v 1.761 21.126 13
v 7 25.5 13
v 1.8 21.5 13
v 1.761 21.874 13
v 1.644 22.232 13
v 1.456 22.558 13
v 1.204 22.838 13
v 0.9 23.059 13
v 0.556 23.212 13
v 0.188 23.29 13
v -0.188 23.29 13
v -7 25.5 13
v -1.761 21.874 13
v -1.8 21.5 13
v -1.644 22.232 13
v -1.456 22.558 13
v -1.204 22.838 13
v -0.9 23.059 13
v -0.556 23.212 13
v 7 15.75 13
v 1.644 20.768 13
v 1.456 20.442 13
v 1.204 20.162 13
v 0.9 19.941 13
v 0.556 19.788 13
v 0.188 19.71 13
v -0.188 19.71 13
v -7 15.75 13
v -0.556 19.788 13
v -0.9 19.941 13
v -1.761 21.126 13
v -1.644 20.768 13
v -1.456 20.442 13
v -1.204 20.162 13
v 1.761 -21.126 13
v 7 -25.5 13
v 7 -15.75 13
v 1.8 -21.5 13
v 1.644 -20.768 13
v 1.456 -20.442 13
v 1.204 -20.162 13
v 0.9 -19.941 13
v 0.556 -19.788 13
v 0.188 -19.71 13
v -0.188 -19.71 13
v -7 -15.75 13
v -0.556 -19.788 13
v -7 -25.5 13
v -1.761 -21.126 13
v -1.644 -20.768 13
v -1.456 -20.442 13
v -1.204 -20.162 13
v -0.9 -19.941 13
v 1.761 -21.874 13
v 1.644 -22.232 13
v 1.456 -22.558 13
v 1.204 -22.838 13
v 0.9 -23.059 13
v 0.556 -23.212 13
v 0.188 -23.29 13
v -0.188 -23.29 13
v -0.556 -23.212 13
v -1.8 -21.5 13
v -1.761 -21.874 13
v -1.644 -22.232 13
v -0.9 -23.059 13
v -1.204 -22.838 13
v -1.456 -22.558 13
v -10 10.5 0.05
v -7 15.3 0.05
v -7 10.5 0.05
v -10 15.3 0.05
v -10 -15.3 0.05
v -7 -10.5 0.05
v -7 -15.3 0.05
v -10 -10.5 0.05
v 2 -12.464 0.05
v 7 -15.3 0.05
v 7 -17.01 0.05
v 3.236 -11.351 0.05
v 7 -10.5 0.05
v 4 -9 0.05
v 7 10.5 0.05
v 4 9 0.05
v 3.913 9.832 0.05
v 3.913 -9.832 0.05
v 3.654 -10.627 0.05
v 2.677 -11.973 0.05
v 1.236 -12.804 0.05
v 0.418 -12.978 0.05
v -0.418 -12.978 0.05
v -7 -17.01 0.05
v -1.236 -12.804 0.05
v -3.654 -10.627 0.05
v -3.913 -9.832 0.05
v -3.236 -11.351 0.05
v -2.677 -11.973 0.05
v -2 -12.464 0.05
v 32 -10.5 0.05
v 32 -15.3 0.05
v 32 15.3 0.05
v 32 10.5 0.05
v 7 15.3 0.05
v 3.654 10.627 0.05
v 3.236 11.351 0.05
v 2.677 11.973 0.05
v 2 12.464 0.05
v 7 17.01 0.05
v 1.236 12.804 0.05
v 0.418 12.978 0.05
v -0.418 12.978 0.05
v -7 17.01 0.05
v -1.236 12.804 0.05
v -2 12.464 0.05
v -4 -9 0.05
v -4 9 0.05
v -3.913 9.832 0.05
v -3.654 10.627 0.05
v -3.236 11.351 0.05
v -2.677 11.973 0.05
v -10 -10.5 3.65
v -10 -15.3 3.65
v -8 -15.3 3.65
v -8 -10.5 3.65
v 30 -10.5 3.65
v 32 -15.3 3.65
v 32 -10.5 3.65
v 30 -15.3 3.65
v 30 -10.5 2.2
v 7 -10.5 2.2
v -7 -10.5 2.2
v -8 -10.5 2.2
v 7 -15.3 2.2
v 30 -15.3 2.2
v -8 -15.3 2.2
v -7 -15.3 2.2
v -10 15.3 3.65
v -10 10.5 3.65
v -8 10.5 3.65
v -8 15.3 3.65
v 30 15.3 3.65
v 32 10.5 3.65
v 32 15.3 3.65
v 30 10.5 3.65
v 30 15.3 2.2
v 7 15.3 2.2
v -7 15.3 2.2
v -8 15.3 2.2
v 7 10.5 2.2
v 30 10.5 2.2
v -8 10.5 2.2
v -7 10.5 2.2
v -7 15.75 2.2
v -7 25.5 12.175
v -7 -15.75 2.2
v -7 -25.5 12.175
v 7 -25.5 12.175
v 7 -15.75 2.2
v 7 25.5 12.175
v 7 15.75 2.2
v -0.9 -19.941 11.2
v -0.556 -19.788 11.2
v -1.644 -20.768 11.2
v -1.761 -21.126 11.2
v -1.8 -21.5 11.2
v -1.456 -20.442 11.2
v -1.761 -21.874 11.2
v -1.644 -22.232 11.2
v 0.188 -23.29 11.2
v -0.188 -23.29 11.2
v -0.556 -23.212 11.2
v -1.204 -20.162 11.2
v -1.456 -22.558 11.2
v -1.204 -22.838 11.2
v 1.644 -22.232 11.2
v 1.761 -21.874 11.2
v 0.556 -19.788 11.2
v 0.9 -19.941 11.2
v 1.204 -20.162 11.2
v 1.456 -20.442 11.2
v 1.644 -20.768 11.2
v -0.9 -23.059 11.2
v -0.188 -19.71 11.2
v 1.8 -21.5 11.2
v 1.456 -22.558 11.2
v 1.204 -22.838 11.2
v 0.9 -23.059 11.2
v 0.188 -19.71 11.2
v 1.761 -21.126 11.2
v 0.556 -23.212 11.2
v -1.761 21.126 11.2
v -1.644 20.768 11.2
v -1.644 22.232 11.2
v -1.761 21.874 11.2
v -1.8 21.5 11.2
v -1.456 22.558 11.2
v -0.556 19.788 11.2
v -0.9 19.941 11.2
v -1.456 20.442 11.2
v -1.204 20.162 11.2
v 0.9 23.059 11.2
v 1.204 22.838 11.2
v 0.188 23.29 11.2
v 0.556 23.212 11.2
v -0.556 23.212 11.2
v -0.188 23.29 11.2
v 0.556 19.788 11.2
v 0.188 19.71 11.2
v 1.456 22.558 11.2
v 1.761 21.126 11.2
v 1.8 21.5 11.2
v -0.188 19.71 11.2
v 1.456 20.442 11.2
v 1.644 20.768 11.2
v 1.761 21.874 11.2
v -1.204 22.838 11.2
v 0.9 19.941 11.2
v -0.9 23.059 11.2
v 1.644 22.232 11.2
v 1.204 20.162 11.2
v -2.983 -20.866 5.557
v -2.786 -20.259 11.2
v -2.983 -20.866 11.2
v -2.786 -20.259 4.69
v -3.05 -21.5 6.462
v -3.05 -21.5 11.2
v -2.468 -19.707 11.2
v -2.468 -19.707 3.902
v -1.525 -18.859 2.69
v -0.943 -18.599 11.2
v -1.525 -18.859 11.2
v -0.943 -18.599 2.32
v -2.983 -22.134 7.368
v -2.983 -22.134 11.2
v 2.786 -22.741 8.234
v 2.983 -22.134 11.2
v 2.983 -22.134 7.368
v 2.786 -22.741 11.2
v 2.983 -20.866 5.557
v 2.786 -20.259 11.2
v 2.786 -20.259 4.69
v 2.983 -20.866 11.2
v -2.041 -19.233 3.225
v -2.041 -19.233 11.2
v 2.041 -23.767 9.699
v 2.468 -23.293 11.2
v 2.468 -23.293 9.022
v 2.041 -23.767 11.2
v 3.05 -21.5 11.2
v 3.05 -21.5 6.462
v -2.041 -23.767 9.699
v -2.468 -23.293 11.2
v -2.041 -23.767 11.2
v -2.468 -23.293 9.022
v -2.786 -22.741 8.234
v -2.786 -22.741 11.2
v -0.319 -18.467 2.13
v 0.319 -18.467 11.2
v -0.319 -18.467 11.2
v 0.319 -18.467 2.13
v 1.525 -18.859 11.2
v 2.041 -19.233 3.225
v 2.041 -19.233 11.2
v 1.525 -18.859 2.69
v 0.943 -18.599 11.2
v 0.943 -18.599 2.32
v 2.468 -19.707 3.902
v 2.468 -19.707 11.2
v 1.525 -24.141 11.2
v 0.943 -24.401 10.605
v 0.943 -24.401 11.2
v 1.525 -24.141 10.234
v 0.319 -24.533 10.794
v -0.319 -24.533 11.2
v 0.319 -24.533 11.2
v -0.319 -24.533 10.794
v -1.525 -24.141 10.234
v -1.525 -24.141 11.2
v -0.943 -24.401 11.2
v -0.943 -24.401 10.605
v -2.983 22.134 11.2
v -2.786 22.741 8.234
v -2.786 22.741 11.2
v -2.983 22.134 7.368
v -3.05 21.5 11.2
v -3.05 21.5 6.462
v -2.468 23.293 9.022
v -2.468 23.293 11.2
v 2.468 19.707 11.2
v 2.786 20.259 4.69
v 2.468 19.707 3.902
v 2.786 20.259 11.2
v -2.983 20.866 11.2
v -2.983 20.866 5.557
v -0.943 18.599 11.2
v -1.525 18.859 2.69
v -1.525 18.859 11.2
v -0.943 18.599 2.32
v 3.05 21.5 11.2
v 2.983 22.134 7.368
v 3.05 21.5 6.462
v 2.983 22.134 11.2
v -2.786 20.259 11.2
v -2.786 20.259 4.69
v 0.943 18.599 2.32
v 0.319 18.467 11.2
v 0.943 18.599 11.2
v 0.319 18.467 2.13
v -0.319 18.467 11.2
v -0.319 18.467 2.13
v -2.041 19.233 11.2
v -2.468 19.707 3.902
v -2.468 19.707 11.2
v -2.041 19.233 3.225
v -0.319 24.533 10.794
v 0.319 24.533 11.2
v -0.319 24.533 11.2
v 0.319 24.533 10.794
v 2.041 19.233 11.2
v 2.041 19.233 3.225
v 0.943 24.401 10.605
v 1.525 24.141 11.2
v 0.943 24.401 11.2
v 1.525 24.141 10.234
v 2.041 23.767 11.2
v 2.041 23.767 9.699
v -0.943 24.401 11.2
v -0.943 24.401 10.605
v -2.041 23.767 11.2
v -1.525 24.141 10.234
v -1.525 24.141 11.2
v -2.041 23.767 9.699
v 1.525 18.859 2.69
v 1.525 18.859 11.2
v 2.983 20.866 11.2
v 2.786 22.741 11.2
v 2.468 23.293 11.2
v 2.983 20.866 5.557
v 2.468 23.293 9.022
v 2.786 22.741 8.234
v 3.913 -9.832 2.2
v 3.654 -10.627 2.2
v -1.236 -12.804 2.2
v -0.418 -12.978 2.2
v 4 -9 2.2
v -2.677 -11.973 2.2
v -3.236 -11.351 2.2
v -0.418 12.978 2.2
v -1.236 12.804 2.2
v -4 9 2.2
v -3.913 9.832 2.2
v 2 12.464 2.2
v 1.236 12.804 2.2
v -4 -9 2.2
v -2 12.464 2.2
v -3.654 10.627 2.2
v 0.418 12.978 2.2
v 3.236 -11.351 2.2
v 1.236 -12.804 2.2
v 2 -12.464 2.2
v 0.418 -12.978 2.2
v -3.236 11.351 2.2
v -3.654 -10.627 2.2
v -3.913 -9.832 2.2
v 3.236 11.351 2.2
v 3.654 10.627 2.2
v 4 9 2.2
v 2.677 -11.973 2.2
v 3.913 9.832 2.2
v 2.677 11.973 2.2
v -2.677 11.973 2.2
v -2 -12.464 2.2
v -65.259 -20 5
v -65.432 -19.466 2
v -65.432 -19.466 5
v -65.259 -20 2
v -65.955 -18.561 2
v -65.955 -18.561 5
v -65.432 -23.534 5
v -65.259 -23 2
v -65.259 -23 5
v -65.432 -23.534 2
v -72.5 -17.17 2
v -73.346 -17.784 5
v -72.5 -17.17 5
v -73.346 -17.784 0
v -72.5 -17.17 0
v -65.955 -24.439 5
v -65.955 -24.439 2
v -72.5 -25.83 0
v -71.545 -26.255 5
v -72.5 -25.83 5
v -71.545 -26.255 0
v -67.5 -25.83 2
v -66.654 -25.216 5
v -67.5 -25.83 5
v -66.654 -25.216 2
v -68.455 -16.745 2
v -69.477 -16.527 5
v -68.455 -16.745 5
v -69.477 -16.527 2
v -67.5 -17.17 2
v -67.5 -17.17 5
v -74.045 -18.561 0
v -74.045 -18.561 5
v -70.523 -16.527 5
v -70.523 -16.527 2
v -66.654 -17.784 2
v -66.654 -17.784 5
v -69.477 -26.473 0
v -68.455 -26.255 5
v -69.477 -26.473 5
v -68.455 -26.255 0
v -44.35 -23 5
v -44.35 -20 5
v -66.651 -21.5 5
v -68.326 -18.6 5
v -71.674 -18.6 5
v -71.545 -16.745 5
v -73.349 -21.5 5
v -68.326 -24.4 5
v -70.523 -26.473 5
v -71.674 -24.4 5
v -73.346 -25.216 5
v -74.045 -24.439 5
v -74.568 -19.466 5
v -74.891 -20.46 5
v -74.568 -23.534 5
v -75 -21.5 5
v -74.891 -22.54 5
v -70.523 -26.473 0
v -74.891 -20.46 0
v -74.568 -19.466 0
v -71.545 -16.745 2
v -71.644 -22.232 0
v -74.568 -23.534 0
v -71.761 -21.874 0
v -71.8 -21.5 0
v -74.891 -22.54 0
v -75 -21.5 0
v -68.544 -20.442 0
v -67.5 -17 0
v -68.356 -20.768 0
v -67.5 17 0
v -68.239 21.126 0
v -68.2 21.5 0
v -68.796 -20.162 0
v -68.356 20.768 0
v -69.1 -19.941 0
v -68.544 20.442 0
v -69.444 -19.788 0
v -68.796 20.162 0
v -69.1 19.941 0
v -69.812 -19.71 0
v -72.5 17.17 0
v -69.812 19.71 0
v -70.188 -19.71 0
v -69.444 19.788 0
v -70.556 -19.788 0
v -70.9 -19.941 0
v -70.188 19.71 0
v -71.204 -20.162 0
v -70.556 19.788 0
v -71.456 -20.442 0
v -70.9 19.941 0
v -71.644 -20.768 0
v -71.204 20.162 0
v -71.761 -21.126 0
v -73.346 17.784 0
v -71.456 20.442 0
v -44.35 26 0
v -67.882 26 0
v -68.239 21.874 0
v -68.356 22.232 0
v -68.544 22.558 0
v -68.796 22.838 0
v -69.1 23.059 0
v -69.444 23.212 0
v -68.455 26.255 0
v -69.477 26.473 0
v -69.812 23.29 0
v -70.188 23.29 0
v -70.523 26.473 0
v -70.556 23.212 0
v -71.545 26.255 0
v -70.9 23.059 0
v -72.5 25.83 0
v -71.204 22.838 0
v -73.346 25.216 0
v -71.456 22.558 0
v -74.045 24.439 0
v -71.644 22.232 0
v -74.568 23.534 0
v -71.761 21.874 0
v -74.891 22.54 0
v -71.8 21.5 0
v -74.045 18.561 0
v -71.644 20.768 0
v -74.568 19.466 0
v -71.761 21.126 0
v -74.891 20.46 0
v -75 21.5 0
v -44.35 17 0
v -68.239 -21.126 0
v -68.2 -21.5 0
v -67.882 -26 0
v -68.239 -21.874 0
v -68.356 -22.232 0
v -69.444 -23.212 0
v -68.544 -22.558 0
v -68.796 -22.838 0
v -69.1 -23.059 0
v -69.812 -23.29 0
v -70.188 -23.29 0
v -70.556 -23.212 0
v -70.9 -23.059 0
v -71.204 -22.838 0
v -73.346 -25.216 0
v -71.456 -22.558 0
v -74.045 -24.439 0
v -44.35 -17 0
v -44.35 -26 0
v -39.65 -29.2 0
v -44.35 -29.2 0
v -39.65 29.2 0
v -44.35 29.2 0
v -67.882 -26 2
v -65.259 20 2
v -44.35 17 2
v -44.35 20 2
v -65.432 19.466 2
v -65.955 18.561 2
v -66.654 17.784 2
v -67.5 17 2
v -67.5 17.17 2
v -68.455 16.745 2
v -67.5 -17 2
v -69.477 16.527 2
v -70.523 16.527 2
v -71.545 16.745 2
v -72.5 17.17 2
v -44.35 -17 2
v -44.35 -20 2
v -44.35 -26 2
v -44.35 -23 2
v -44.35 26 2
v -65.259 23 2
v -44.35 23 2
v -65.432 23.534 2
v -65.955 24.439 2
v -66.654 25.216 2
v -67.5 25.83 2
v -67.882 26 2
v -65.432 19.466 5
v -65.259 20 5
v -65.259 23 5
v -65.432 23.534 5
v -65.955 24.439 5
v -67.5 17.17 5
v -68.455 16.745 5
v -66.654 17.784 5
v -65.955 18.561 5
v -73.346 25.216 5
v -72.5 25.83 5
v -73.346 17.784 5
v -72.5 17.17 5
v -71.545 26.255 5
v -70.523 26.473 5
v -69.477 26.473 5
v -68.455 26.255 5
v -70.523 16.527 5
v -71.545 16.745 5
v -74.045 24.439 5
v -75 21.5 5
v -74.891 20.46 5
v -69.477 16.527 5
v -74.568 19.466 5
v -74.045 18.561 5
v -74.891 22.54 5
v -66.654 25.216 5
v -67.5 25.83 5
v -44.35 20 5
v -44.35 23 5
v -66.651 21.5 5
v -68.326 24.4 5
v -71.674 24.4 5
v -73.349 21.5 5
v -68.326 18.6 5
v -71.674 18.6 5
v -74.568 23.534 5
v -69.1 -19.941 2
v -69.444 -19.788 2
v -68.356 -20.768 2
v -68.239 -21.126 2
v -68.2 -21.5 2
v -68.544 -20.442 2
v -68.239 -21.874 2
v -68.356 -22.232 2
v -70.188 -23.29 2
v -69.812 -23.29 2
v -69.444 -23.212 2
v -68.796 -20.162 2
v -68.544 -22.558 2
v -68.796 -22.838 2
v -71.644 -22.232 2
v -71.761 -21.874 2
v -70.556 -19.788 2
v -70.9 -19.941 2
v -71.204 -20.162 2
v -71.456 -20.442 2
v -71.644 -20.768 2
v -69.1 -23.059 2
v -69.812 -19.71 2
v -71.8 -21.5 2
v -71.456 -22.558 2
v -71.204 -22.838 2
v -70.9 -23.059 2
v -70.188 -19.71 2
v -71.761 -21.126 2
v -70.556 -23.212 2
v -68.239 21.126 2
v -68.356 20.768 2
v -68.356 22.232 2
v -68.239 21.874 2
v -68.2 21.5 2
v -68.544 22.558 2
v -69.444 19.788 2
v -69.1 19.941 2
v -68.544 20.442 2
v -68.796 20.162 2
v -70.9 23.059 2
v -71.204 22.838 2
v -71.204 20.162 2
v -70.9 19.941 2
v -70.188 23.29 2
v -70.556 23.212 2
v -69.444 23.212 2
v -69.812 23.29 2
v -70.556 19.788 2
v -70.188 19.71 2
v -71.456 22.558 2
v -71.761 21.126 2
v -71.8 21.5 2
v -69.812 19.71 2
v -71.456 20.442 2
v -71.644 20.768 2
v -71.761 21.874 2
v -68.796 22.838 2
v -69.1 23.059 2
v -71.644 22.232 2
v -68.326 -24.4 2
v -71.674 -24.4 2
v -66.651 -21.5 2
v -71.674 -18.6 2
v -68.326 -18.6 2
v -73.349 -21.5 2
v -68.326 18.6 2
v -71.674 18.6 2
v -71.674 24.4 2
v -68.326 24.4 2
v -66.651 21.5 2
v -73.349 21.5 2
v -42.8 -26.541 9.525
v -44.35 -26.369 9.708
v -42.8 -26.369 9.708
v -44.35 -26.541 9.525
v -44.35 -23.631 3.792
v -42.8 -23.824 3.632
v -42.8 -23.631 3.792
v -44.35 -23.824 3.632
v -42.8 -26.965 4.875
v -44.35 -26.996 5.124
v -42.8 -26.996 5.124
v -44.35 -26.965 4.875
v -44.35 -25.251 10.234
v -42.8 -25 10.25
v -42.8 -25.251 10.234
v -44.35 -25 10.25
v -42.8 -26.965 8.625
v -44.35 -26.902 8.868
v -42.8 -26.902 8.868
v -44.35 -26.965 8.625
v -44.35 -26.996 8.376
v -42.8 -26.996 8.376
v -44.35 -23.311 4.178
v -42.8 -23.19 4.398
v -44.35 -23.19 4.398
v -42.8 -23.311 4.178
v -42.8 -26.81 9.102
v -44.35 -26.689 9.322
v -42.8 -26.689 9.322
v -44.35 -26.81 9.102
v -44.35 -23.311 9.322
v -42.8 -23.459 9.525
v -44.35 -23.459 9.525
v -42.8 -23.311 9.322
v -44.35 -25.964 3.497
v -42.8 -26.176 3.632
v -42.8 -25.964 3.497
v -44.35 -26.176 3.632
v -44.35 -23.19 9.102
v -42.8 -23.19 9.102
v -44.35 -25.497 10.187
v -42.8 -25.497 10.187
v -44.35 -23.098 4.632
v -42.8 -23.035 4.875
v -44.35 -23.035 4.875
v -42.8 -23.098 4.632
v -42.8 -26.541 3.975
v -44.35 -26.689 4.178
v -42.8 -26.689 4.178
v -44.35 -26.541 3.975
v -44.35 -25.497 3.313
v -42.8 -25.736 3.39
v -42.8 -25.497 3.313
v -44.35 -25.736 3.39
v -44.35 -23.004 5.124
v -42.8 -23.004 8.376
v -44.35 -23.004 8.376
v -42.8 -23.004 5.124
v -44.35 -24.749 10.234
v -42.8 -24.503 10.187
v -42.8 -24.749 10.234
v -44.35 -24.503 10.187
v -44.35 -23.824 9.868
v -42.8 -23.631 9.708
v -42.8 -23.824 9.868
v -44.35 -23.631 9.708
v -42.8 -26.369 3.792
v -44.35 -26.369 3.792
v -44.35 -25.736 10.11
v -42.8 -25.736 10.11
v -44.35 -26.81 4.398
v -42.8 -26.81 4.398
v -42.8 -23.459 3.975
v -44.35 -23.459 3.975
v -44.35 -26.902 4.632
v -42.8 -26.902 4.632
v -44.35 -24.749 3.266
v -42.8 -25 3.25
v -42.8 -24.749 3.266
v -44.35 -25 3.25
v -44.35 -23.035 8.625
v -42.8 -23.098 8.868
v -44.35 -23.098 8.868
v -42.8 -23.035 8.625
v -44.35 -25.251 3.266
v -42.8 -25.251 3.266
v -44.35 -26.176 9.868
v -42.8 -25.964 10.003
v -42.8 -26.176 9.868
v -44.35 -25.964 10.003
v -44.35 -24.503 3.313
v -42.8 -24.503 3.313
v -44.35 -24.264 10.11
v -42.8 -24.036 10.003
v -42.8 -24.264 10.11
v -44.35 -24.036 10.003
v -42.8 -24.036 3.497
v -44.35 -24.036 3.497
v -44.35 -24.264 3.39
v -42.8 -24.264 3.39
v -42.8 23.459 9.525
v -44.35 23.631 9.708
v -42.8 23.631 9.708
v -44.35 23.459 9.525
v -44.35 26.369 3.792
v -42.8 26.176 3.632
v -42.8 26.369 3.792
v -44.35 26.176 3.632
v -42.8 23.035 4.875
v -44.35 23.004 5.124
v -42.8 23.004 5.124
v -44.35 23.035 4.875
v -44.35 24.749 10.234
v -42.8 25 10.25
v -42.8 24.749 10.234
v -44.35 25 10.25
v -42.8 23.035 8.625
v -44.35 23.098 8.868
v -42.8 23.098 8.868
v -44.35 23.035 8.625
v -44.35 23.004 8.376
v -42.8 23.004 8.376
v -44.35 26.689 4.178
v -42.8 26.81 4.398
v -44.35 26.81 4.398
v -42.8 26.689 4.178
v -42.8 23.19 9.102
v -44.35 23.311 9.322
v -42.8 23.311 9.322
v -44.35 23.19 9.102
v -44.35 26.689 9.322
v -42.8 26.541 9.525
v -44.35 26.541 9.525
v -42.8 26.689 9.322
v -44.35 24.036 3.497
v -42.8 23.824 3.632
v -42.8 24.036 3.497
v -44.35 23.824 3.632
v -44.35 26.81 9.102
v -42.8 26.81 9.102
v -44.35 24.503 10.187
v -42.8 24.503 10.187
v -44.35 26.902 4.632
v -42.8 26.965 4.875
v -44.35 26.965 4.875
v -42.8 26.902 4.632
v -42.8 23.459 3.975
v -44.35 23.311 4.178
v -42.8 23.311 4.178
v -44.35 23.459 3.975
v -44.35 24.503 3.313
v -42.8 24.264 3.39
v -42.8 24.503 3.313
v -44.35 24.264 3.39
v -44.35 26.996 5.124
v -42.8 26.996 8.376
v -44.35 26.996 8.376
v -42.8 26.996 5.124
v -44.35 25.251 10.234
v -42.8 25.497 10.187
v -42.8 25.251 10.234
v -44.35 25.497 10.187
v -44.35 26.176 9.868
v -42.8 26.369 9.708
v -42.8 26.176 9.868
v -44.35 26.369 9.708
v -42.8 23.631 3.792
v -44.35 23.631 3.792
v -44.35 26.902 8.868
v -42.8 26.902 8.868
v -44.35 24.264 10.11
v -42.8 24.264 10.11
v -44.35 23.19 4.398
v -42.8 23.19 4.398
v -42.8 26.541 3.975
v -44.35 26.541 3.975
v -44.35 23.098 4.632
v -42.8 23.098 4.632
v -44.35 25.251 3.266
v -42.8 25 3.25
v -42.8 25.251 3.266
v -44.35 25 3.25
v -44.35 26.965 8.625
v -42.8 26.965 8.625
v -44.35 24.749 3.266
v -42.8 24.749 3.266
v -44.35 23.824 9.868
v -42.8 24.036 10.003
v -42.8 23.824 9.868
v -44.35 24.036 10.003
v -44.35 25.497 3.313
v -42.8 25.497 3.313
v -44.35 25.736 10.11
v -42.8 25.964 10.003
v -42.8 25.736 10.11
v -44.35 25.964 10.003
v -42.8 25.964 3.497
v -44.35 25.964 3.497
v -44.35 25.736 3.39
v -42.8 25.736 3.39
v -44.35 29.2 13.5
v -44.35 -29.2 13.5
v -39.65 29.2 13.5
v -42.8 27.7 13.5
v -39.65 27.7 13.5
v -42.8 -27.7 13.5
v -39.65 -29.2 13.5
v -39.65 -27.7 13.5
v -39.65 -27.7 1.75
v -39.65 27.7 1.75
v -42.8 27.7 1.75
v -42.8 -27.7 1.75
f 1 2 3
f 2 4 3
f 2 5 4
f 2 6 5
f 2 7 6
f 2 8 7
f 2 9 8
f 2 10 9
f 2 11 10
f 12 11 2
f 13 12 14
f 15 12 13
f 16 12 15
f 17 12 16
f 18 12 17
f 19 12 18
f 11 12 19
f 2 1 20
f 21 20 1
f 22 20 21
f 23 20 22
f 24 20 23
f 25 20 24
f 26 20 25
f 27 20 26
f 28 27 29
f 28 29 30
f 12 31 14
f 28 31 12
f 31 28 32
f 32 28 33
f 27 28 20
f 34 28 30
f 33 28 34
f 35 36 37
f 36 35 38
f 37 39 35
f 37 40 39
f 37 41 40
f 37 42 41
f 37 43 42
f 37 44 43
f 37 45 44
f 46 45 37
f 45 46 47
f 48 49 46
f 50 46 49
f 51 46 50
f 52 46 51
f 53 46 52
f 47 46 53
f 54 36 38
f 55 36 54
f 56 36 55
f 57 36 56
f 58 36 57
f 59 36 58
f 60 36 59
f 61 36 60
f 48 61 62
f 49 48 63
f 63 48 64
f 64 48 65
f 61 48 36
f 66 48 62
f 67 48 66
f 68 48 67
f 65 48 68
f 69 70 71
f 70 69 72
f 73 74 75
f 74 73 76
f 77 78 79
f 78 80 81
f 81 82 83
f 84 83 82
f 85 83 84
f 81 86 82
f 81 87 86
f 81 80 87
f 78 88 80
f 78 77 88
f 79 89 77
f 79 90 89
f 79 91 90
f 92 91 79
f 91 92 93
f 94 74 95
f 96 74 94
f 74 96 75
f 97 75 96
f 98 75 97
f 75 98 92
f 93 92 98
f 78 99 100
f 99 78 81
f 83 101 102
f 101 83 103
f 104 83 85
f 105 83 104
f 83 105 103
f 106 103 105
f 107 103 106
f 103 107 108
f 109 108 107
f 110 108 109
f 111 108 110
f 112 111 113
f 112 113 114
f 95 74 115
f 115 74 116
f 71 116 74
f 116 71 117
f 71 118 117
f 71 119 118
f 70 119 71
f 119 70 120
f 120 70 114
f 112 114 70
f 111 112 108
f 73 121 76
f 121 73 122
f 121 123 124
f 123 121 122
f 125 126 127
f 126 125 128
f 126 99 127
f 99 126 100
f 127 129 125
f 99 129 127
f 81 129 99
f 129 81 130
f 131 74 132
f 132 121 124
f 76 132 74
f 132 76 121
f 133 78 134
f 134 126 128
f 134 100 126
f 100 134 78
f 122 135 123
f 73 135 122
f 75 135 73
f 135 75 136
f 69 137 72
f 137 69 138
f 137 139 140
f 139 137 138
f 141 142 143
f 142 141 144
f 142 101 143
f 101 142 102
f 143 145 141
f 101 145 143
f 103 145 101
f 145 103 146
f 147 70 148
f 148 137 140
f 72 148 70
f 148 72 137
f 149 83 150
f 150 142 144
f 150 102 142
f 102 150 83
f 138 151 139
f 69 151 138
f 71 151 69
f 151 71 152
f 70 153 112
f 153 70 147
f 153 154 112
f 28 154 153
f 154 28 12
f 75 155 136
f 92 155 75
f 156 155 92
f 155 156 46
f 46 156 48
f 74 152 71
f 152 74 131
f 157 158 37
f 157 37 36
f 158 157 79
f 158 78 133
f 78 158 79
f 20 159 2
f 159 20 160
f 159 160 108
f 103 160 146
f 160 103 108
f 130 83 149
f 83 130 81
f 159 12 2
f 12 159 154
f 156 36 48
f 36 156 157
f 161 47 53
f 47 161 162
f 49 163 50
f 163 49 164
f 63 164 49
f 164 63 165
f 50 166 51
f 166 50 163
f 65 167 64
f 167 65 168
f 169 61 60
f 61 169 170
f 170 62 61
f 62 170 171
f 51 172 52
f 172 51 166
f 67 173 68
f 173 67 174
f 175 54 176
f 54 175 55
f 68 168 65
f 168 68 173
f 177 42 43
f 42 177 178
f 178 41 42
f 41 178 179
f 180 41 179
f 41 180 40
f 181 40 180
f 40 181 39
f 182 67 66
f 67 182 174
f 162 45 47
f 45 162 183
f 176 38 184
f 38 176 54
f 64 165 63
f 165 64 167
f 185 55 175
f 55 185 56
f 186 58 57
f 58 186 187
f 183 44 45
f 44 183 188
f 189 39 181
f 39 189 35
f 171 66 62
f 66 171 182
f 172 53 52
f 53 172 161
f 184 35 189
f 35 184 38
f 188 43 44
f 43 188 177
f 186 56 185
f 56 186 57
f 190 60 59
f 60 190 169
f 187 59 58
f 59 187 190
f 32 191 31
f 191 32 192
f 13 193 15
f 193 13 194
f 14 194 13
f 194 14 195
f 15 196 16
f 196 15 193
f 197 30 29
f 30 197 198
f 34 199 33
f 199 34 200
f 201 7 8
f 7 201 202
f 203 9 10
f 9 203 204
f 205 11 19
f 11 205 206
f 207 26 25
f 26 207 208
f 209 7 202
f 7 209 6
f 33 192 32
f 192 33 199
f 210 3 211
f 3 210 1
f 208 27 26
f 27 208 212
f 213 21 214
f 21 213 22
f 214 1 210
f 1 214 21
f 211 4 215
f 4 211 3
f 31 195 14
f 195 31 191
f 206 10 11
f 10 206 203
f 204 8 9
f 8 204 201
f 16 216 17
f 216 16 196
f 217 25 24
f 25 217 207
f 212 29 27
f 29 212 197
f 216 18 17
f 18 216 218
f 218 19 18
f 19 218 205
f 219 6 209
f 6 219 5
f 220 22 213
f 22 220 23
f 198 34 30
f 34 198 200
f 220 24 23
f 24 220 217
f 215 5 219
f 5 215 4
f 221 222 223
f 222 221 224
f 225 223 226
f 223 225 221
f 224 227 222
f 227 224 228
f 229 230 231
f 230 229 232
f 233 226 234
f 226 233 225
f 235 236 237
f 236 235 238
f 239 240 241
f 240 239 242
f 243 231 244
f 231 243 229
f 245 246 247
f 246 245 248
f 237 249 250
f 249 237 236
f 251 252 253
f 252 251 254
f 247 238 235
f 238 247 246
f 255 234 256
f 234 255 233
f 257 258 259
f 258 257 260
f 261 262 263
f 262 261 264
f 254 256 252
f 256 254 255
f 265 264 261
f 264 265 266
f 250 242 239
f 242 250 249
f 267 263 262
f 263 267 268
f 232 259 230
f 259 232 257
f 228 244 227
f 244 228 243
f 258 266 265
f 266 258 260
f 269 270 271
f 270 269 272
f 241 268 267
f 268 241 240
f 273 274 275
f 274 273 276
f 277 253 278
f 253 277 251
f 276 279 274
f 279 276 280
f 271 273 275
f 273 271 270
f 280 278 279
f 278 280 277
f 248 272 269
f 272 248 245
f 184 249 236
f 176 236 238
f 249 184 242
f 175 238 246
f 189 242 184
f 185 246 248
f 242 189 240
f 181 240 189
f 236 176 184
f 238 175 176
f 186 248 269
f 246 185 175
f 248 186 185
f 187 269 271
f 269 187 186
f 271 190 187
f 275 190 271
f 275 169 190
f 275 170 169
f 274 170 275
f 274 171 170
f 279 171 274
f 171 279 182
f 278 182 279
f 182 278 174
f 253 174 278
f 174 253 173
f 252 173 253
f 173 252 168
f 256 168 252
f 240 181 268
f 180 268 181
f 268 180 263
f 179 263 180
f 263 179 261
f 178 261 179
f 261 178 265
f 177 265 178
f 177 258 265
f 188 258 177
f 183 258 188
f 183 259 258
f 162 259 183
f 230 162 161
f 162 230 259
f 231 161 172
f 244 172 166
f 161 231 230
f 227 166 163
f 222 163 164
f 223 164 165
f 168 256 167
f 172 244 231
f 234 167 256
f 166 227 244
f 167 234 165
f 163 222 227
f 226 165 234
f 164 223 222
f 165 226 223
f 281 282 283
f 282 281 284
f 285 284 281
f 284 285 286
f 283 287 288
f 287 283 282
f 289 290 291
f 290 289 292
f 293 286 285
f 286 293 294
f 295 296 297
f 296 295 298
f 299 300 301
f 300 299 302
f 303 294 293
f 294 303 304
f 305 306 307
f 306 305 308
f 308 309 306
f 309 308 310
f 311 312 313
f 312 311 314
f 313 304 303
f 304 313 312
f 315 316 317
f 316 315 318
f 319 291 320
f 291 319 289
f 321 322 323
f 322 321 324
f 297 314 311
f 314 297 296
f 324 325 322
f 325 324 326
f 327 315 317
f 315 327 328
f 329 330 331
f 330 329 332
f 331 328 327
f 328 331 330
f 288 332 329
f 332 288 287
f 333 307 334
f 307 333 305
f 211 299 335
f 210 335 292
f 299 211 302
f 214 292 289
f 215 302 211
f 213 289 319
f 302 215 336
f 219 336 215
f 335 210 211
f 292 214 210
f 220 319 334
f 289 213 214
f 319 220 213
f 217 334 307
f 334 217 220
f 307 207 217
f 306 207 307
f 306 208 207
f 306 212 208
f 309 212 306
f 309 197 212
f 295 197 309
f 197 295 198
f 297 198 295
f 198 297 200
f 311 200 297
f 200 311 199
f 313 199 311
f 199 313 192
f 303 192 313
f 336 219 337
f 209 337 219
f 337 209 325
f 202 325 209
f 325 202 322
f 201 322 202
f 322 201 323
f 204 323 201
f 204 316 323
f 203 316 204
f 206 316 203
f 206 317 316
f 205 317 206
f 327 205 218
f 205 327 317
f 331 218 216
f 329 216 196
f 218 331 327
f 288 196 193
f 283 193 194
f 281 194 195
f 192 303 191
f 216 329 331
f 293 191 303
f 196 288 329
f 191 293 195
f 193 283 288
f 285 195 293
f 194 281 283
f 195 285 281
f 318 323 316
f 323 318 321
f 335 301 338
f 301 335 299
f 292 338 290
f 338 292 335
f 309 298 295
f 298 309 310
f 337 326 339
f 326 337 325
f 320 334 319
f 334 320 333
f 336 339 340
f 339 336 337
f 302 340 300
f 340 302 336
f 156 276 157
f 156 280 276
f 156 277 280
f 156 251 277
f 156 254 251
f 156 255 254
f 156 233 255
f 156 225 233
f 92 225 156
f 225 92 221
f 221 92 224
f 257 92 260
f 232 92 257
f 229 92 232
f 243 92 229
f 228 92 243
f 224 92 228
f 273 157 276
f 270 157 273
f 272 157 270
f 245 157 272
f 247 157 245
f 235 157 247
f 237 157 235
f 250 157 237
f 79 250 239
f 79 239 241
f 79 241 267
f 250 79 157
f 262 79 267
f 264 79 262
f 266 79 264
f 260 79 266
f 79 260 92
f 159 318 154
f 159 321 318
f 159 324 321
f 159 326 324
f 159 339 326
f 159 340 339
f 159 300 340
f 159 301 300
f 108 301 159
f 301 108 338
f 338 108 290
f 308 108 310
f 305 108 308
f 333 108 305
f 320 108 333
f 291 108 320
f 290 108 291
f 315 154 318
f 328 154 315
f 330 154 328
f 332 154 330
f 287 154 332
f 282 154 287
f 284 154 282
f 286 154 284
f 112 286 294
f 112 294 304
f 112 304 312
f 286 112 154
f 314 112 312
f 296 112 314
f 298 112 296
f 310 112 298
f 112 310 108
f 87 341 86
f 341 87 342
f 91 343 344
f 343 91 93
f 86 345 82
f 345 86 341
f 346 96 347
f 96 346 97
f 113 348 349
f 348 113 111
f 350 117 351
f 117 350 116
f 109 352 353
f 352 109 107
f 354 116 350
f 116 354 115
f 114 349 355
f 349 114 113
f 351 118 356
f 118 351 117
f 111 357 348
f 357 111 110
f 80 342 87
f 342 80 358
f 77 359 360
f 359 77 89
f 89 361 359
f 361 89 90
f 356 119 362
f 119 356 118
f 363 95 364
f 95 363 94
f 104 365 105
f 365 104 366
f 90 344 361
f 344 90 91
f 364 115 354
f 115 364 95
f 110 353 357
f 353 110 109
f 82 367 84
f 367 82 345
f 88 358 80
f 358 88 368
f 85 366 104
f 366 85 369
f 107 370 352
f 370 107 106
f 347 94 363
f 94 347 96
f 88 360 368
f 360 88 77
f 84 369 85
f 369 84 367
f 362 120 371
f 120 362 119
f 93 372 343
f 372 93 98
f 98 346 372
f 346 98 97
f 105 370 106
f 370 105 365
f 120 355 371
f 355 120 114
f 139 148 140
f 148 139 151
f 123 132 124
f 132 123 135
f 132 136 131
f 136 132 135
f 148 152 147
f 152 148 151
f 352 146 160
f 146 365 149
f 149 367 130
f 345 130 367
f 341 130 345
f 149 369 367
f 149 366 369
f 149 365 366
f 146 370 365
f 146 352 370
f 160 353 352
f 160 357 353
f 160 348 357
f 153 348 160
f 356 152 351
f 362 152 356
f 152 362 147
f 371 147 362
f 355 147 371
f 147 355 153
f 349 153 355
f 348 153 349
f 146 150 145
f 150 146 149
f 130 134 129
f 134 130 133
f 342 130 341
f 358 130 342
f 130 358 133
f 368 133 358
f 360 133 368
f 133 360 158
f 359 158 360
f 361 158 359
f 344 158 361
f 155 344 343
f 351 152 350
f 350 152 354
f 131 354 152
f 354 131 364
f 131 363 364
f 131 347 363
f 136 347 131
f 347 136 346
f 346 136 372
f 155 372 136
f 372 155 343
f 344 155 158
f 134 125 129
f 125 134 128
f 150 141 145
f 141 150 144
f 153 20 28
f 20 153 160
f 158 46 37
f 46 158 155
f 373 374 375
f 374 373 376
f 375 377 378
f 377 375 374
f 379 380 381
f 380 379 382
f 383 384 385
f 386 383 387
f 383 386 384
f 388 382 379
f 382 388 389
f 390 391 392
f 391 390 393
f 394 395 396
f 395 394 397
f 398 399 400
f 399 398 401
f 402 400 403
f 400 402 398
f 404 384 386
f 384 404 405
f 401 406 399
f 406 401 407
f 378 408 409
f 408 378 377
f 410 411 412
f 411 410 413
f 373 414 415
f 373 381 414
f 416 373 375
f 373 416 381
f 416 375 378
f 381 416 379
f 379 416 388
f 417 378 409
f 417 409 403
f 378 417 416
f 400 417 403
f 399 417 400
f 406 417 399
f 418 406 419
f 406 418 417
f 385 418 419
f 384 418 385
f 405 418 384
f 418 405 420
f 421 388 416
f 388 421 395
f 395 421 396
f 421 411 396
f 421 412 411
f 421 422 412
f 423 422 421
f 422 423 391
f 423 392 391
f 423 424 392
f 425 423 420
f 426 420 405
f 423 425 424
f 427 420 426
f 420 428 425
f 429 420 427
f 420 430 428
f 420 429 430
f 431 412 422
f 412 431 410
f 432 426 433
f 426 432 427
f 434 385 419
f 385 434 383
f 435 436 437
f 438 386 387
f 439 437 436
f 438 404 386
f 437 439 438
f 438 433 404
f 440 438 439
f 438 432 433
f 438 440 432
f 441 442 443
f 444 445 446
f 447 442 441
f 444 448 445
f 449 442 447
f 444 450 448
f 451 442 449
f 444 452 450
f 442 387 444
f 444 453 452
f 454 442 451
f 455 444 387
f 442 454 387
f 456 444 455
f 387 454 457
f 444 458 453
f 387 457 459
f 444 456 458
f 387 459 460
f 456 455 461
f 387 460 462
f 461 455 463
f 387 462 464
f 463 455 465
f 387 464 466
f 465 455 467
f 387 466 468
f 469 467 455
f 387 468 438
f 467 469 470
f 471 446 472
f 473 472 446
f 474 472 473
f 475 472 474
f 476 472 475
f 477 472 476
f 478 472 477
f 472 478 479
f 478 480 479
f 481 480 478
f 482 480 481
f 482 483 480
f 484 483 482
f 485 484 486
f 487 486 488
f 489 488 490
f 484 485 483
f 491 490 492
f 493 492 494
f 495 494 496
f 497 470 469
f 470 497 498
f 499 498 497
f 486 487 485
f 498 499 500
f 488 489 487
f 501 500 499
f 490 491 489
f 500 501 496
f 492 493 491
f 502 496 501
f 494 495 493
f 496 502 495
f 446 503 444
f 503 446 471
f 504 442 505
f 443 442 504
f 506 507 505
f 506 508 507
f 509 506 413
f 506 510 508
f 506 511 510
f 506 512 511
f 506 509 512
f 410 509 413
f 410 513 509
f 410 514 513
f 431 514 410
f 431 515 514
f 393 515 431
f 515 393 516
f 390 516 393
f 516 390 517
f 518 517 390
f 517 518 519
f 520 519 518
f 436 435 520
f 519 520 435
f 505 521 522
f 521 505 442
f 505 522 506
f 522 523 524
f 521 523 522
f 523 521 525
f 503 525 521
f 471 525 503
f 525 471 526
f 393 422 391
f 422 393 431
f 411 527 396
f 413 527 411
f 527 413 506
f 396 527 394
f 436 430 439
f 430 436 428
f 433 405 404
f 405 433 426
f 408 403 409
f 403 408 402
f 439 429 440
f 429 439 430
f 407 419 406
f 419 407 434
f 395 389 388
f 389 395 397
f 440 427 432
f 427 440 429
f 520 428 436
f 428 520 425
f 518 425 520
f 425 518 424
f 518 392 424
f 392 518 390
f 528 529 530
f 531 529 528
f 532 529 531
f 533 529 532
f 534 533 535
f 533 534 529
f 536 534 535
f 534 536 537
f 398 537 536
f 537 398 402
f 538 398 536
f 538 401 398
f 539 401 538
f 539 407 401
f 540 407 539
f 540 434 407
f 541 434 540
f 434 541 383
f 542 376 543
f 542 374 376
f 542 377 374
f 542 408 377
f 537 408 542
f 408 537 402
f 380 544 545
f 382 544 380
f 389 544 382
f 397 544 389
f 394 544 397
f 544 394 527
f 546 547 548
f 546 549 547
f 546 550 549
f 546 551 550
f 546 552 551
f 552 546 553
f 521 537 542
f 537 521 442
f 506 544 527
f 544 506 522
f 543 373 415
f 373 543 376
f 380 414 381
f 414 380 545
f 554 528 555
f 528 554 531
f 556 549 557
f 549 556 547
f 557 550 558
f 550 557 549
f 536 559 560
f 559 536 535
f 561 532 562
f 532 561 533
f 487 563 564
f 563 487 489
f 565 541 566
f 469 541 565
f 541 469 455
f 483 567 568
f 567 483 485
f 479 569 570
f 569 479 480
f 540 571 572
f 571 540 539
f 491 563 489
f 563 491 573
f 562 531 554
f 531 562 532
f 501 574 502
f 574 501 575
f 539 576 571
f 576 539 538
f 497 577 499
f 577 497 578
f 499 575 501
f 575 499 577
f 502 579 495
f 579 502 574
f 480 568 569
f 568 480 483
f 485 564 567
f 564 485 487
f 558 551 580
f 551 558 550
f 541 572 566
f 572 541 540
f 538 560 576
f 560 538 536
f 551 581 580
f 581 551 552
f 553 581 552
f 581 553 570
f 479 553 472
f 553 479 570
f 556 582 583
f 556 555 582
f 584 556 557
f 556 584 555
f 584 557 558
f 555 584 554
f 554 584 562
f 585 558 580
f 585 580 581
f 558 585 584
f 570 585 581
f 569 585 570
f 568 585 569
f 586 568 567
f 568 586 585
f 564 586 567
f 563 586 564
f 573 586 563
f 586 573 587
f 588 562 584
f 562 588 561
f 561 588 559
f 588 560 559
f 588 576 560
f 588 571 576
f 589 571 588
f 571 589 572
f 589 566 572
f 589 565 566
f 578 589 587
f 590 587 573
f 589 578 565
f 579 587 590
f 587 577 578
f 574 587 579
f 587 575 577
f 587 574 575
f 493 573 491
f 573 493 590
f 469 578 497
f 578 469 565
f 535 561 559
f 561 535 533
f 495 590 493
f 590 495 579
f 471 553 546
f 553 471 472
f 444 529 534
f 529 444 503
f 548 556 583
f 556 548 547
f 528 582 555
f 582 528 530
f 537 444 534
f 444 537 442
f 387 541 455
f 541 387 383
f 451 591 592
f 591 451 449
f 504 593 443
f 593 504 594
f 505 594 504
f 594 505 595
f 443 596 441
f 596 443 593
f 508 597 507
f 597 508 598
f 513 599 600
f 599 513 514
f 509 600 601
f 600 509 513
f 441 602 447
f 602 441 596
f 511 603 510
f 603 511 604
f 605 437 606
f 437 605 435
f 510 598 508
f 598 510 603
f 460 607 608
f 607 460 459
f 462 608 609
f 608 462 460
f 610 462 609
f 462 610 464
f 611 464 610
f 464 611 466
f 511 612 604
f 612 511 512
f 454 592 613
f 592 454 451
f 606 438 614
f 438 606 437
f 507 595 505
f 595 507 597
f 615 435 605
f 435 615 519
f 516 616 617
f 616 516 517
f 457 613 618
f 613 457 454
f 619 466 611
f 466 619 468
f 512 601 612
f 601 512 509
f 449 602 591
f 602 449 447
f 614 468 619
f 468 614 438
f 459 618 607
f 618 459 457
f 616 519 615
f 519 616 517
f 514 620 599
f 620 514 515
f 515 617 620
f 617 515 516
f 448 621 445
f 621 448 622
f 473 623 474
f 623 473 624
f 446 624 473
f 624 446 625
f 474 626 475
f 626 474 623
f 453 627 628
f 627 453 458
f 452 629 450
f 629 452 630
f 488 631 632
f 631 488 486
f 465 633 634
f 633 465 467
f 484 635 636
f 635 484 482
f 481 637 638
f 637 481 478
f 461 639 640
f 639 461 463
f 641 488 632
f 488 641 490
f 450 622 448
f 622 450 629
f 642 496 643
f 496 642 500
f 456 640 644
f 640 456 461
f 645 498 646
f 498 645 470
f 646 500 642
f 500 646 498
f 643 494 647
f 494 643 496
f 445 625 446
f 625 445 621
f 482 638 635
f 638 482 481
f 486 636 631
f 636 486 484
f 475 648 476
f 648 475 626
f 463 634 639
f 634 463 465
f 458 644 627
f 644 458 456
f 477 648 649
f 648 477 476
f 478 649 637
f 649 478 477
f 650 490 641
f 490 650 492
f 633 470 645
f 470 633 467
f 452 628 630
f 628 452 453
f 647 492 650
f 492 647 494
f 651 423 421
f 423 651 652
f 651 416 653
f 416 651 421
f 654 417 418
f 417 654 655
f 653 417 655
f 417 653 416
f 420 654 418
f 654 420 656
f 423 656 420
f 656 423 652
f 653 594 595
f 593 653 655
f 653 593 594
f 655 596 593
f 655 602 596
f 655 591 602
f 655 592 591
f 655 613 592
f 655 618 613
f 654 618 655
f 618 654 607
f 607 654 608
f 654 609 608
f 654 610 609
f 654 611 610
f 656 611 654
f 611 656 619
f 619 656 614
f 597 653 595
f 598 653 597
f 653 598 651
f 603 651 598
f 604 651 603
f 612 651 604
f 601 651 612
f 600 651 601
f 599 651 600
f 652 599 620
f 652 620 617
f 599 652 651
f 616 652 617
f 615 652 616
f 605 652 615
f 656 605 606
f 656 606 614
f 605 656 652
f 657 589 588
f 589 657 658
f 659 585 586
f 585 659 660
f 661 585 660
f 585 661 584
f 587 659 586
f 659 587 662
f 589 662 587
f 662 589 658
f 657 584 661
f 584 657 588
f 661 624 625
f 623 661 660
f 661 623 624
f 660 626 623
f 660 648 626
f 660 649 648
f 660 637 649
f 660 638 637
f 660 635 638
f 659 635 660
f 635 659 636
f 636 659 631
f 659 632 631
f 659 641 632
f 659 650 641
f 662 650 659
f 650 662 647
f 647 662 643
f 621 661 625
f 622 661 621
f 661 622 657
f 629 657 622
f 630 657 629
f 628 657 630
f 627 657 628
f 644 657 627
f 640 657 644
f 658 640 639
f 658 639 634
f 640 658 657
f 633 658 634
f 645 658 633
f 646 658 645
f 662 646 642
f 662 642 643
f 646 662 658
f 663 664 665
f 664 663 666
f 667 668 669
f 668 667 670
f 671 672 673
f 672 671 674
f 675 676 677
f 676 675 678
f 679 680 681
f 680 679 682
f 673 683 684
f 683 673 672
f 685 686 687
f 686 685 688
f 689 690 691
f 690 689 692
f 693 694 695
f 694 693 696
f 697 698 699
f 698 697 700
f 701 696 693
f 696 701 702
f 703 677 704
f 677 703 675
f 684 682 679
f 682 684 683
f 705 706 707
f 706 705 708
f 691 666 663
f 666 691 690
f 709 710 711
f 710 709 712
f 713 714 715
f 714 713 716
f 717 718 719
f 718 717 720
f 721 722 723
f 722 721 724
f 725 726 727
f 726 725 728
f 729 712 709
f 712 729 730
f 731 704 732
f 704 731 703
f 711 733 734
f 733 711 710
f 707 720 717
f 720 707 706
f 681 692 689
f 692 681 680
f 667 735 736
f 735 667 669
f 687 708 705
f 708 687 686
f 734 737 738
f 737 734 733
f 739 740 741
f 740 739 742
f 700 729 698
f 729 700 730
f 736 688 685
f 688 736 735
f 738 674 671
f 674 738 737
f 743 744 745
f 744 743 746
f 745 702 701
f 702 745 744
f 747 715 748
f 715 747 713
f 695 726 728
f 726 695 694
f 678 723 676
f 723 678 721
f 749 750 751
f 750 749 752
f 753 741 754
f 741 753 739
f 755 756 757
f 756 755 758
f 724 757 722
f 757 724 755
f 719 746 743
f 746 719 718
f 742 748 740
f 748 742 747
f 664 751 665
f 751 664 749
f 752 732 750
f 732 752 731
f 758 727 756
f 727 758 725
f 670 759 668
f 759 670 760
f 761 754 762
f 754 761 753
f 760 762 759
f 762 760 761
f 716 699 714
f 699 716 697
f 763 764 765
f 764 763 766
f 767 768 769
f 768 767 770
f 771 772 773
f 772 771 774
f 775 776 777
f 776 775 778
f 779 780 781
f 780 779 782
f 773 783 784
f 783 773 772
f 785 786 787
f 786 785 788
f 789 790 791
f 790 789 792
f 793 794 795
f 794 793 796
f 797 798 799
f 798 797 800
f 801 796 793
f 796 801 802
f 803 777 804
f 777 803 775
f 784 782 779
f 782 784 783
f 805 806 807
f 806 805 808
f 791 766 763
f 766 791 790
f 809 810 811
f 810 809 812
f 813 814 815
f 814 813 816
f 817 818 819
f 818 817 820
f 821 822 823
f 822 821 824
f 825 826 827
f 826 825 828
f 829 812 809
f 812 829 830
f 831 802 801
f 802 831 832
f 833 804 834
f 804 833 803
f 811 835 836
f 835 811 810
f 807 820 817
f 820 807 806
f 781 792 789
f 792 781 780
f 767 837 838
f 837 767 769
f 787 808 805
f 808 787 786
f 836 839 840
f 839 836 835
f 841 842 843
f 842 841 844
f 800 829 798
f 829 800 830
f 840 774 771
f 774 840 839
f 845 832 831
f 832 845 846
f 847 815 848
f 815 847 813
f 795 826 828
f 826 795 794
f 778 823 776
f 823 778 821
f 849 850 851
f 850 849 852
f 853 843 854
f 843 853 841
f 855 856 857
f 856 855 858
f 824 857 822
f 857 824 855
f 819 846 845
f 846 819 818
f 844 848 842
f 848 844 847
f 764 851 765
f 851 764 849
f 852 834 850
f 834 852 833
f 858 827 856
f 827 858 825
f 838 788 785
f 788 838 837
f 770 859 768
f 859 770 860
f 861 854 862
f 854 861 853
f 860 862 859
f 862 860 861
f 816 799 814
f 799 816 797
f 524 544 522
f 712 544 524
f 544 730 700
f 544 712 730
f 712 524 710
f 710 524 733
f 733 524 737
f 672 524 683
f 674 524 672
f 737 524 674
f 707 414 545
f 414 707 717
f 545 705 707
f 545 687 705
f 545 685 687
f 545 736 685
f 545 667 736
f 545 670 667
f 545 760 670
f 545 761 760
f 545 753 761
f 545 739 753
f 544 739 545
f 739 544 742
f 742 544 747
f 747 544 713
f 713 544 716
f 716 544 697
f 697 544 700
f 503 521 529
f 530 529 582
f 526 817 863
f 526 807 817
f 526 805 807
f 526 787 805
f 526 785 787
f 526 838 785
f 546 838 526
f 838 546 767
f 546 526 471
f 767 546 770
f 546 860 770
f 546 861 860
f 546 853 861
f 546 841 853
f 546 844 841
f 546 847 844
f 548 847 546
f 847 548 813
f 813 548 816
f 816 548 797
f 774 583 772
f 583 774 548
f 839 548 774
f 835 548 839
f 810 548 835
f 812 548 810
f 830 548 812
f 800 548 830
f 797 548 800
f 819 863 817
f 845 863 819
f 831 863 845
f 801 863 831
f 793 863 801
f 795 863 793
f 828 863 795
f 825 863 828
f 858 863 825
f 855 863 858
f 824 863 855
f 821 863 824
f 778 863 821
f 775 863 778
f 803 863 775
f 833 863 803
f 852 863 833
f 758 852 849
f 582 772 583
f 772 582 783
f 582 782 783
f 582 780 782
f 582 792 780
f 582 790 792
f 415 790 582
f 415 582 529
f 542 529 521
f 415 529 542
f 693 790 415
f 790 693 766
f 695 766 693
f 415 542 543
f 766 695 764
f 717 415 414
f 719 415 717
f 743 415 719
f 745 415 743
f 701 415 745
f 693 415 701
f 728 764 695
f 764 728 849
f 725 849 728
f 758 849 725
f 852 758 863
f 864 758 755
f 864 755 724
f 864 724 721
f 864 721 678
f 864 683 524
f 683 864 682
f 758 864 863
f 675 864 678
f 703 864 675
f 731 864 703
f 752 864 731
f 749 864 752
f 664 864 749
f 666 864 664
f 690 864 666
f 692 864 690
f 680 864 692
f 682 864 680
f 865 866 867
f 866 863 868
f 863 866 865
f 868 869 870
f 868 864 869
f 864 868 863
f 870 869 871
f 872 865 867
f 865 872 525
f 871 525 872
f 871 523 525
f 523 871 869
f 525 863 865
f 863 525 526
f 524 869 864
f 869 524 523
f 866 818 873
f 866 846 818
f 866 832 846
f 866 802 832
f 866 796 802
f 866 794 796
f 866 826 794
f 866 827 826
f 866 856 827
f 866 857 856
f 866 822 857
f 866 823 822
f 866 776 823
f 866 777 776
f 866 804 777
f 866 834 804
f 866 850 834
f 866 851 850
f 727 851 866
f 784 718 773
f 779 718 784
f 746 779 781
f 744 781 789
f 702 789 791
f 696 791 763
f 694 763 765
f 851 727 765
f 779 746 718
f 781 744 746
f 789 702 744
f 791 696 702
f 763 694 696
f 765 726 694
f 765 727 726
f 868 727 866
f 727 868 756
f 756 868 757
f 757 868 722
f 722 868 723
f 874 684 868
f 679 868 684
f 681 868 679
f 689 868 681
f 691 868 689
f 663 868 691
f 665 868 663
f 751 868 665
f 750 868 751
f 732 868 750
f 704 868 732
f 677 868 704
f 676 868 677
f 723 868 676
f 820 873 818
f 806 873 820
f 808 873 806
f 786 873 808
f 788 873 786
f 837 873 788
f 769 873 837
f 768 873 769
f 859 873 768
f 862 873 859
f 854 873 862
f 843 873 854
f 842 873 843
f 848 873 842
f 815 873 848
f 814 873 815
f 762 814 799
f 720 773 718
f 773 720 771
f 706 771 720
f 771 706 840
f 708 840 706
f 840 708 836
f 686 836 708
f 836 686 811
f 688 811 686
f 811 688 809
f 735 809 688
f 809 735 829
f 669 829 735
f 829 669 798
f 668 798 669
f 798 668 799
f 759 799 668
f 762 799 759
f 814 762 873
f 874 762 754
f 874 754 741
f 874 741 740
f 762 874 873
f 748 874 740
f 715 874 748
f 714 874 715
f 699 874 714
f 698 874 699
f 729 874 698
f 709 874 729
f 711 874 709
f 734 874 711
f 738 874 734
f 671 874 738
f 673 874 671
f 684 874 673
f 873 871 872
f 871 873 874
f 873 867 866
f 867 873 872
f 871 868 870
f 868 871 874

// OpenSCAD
// EMAX nighthawk accessories  - a OpenSCAD 
// Copyright (C) 2016  Gerard Valade

// This program is free software: you can redistribute it and/or modify
// it under the terms of the GNU General Public License as published by
// the Free Software Foundation, either version 3 of the License, or
// (at your option) any later version.

// This program is distributed in the hope that it will be useful,
// but WITHOUT ANY WARRANTY; without even the implied warranty of
// MERCHANTABILITY or FITNESS FOR A PARTICULAR PURPOSE.  See the
// GNU General Public License for more details.

// You should have received a copy of the GNU General Public License
// along with this program.  If not, see <http://www.gnu.org/licenses/>.

$fn=30;


transmitter_heigth = 10.65;
transmitter_width=30.5;
transmitter_length=37;

M3_dia = 3.6;
M3_hole = 2.5;
M3_hexa = 5.4+0.4;
M3_head_hole = 5.4+0.7;

module hexaprismx(
	ri =  1.0,  // radius of inscribed circle
	h  =  1.0)  // height of hexaprism
{ // -----------------------------------------------

	ra = ri*2/sqrt(3);
	cylinder(r = ra, h=h, $fn=6, center=false);
}


module video_transmitter()
{
	translate([0, 0, transmitter_heigth/2])  color("gray") cube([transmitter_length, transmitter_width, transmitter_heigth], center=true);
	translate([-37/2+3.5, 0, transmitter_heigth]) {
		translate([0, 0, 11.30]) color("red") cylinder(d=7.23, h=42.66);
		translate([0, 0, 0]) color("yellow") cylinder(d=7.5, h=11.30);
		translate([0, 0, 3]) color("yellow") hexaprismx(ri=4, h=6.2, $fn=6);
		
	} 	
	
}

module video_bracket_simple(heigth)
{
	thick = 2.5;
	width = transmitter_width+2*thick+1;
	heigth = transmitter_heigth+thick+0.5;
	length  = 10;
	translate([0, 0, 0])  difference()
	{
		union()
		{
			translate([0, 0, (heigth)/2])  cube([length, width, heigth], center=true);
			translate([0, 0, (thick)/2])  cube([length, 56, thick], center=true);
			for(y=[-1, 1]) translate([0, y*43/2, 0]) cylinder(d=6, h=thick+3);
		}
		translate([0, 0, transmitter_heigth/2-0.05])  cube([transmitter_length+1, transmitter_width+1, transmitter_heigth+0.4], center=true);
		for(y=[-1, 1]) translate([0, y*43/2, -1])  cylinder(d=M3_dia, h=10);
	}
}
module video_led_bracket(heigth)
{
	thick = 2;
	width = 43;
	heigth = 2;
	length  = 3;
	led_pos = 28;
	ra = M3_hexa*2/sqrt(3);
	translate([0, 0, 0])  difference()
	{
		union()
		{
			translate([0, 0, (thick)/2])  cube([5, width, thick], center=true);
			for(y=[-1, 1]) {
				translate([0, y*43/2, 0]) cylinder(d=10, h=thick+3);
				translate([led_pos/2-2, y*43/2, (thick)/2])  cube([led_pos, 9, thick], center=true);
				translate([led_pos/2-2, y*43/2, (thick+3)/2])  cube([led_pos, 3, thick+3], center=true);
			}
		}
		for(y=[-1, 1]) translate([0, y*43/2, -1])  cylinder(d=M3_dia, h=10);
		for(y=[-1, 1]) translate([0, y*43/2, thick])  cylinder(d=ra, h=4, $fn=6); //hexaprismx(ri=M3_hexa, h=5);
	}
	translate([led_pos, 0, 13.5/2]) mirror([0, 0, 1]) mirror([1, 0, 0])  led_plate(13.5);
}

module led_plate(heigth)
{ 
	led_length = 54.4 + 1;
	difference()
	{
		cube([4.7, led_length+3, heigth], center=true);
		translate([-0.8, 0, +0.5-1.5]) cube([3.2, led_length, 12], center=true);
		for(x = [-1, 1]) {
			translate([0, x*25, 0]) rotate([0, 90, 0]) hull()
			{
				translate([1.5, 0, 0])  cylinder(d=4, h=15, center=true, $fn=50);
				translate([-1.5, 0, 0])  cylinder(d=4, h=15, center=true, $fn=50);
				
			}
		}
	}
}

module video_bracket(heigth)
{
	thick = 1.8;
	width = transmitter_width+2*thick+1;
	heigth = transmitter_heigth+thick+0.5;
	length  = 14;
	offset = -11;
	
	
	

	module triangle()
	{
		for(y = [0]) {
			translate([-length/2, 13+y, 0])
			cube([length, 12, heigth]);
			//rotate([0, -90, 0]) linear_extrude(height = 1, center = true, convexity = 10, twist = 0) polygon(points=[[0, 0],[heigth-thick, 0],[0, 10.8]], convexity=10);
		}
	
	}	
	module triangle2()
	{
		for(y = [0:2.8:length-1]) {
			translate([-length/2, 13+y, 0]) cube([length, 0.8, heigth]);
			//rotate([0, -90, 0]) linear_extrude(height = 1, center = true, convexity = 10, twist = 0) polygon(points=[[0, 0],[heigth-thick, 0],[0, 10.8]], convexity=10);
		}
	
	}	
	module triangle1()
	{
		for(x = [0:2.8:length-1]) {
			translate([x-length/2+0.5, 17.15, thick])
			rotate([0, -90, 0]) linear_extrude(height = 1, center = true, convexity = 10, twist = 0) polygon(points=[[0, 0],[heigth-thick, 0],[0, 10.8]], convexity=10);
		}
	
	}
	
		
	translate([0, 0, 0])  difference()
	{
		union()
		{
			//translate([0, 0, heigth/2])  cube([length, width, heigth], center=true);
			translate([0, 0, heigth/2])  cube([length, 51, heigth], center=true);
			translate([0, 0, heigth-1/2])  cube([length, 50, 1], center=true);
			translate([0, 0, (thick)/2])  cube([length, 50, thick], center=true);
			for(y=[-1, 1]) translate([0, y*43/2, 0]) cylinder(d=6, h=thick+3);
			triangle();
			mirror([0, 1, 0]) triangle();
			for(y=[-1, 1]) translate([0, y*43/2, 0])  cylinder(d=M3_head_hole+1.5, h=heigth);
			translate([offset, 0, 0]) for(y=[-1, 1]) translate([0, y*12.9, heigth-thick])  
			{
				cube([transmitter_length+5, 4.8, thick*2], center=true);
			}
		}
		translate([0, 0, transmitter_heigth-0.05])	hull()
		{
			translate([0, 18/2, 0]) cylinder(d=length-6, h=thick*2);
			translate([0,  -18/2, 0]) cylinder(d=length-6, h=thick*2);
		}
		
		translate([offset, 0, transmitter_heigth/2-0.05])  cube([transmitter_length+1, transmitter_width+1, transmitter_heigth+0.4], center=true);
		for(y=[-1, 1]) translate([0, y*43/2, -1])  cylinder(d=M3_dia, h=heigth+5);
		for(y=[-1, 1]) translate([0, y*43/2, thick])  cylinder(d=M3_head_hole, h=heigth+15);

		for(y = [-1,1]) {
			translate([0, y*25, 12]) 	rotate([y*35, 0, 0]) cube([length+12, 12, heigth+15], center=true);
			//rotate([0, -90, 0]) linear_extrude(height = 1, center = true, convexity = 10, twist = 0) polygon(points=[[0, 0],[heigth-thick, 0],[0, 10.8]], convexity=10);
		}

	}
		
	
	//translate([-32.8, 0, -13.4/2+heigth])	rotate([0, 0, 0]) led_plate(13.4);	
	
}

module video_transmitter_view()
{
	//translate([5, 0, 0]) rotate([0, 0, 0]) video_bracket_simple();
	translate([5, 0, 0]) rotate([0, 0, 0]) video_bracket();
	translate([-6, 0, 0]) rotate([0, 0, 0]) video_transmitter();
	translate([5, 0, -2]) rotate([0, 180, 0])  video_led_bracket();
}
//translate([80, 0, 0]) video_transmitter_view();
//translate([-30, 0, 0]) rotate([0, 0, 0]) video_bracket_simple();
translate([0, 0, 13]) rotate([0, 180, 0]) video_bracket();
translate([-70, 0, 0]) rotate([0, 0, 0])  video_led_bracket();
